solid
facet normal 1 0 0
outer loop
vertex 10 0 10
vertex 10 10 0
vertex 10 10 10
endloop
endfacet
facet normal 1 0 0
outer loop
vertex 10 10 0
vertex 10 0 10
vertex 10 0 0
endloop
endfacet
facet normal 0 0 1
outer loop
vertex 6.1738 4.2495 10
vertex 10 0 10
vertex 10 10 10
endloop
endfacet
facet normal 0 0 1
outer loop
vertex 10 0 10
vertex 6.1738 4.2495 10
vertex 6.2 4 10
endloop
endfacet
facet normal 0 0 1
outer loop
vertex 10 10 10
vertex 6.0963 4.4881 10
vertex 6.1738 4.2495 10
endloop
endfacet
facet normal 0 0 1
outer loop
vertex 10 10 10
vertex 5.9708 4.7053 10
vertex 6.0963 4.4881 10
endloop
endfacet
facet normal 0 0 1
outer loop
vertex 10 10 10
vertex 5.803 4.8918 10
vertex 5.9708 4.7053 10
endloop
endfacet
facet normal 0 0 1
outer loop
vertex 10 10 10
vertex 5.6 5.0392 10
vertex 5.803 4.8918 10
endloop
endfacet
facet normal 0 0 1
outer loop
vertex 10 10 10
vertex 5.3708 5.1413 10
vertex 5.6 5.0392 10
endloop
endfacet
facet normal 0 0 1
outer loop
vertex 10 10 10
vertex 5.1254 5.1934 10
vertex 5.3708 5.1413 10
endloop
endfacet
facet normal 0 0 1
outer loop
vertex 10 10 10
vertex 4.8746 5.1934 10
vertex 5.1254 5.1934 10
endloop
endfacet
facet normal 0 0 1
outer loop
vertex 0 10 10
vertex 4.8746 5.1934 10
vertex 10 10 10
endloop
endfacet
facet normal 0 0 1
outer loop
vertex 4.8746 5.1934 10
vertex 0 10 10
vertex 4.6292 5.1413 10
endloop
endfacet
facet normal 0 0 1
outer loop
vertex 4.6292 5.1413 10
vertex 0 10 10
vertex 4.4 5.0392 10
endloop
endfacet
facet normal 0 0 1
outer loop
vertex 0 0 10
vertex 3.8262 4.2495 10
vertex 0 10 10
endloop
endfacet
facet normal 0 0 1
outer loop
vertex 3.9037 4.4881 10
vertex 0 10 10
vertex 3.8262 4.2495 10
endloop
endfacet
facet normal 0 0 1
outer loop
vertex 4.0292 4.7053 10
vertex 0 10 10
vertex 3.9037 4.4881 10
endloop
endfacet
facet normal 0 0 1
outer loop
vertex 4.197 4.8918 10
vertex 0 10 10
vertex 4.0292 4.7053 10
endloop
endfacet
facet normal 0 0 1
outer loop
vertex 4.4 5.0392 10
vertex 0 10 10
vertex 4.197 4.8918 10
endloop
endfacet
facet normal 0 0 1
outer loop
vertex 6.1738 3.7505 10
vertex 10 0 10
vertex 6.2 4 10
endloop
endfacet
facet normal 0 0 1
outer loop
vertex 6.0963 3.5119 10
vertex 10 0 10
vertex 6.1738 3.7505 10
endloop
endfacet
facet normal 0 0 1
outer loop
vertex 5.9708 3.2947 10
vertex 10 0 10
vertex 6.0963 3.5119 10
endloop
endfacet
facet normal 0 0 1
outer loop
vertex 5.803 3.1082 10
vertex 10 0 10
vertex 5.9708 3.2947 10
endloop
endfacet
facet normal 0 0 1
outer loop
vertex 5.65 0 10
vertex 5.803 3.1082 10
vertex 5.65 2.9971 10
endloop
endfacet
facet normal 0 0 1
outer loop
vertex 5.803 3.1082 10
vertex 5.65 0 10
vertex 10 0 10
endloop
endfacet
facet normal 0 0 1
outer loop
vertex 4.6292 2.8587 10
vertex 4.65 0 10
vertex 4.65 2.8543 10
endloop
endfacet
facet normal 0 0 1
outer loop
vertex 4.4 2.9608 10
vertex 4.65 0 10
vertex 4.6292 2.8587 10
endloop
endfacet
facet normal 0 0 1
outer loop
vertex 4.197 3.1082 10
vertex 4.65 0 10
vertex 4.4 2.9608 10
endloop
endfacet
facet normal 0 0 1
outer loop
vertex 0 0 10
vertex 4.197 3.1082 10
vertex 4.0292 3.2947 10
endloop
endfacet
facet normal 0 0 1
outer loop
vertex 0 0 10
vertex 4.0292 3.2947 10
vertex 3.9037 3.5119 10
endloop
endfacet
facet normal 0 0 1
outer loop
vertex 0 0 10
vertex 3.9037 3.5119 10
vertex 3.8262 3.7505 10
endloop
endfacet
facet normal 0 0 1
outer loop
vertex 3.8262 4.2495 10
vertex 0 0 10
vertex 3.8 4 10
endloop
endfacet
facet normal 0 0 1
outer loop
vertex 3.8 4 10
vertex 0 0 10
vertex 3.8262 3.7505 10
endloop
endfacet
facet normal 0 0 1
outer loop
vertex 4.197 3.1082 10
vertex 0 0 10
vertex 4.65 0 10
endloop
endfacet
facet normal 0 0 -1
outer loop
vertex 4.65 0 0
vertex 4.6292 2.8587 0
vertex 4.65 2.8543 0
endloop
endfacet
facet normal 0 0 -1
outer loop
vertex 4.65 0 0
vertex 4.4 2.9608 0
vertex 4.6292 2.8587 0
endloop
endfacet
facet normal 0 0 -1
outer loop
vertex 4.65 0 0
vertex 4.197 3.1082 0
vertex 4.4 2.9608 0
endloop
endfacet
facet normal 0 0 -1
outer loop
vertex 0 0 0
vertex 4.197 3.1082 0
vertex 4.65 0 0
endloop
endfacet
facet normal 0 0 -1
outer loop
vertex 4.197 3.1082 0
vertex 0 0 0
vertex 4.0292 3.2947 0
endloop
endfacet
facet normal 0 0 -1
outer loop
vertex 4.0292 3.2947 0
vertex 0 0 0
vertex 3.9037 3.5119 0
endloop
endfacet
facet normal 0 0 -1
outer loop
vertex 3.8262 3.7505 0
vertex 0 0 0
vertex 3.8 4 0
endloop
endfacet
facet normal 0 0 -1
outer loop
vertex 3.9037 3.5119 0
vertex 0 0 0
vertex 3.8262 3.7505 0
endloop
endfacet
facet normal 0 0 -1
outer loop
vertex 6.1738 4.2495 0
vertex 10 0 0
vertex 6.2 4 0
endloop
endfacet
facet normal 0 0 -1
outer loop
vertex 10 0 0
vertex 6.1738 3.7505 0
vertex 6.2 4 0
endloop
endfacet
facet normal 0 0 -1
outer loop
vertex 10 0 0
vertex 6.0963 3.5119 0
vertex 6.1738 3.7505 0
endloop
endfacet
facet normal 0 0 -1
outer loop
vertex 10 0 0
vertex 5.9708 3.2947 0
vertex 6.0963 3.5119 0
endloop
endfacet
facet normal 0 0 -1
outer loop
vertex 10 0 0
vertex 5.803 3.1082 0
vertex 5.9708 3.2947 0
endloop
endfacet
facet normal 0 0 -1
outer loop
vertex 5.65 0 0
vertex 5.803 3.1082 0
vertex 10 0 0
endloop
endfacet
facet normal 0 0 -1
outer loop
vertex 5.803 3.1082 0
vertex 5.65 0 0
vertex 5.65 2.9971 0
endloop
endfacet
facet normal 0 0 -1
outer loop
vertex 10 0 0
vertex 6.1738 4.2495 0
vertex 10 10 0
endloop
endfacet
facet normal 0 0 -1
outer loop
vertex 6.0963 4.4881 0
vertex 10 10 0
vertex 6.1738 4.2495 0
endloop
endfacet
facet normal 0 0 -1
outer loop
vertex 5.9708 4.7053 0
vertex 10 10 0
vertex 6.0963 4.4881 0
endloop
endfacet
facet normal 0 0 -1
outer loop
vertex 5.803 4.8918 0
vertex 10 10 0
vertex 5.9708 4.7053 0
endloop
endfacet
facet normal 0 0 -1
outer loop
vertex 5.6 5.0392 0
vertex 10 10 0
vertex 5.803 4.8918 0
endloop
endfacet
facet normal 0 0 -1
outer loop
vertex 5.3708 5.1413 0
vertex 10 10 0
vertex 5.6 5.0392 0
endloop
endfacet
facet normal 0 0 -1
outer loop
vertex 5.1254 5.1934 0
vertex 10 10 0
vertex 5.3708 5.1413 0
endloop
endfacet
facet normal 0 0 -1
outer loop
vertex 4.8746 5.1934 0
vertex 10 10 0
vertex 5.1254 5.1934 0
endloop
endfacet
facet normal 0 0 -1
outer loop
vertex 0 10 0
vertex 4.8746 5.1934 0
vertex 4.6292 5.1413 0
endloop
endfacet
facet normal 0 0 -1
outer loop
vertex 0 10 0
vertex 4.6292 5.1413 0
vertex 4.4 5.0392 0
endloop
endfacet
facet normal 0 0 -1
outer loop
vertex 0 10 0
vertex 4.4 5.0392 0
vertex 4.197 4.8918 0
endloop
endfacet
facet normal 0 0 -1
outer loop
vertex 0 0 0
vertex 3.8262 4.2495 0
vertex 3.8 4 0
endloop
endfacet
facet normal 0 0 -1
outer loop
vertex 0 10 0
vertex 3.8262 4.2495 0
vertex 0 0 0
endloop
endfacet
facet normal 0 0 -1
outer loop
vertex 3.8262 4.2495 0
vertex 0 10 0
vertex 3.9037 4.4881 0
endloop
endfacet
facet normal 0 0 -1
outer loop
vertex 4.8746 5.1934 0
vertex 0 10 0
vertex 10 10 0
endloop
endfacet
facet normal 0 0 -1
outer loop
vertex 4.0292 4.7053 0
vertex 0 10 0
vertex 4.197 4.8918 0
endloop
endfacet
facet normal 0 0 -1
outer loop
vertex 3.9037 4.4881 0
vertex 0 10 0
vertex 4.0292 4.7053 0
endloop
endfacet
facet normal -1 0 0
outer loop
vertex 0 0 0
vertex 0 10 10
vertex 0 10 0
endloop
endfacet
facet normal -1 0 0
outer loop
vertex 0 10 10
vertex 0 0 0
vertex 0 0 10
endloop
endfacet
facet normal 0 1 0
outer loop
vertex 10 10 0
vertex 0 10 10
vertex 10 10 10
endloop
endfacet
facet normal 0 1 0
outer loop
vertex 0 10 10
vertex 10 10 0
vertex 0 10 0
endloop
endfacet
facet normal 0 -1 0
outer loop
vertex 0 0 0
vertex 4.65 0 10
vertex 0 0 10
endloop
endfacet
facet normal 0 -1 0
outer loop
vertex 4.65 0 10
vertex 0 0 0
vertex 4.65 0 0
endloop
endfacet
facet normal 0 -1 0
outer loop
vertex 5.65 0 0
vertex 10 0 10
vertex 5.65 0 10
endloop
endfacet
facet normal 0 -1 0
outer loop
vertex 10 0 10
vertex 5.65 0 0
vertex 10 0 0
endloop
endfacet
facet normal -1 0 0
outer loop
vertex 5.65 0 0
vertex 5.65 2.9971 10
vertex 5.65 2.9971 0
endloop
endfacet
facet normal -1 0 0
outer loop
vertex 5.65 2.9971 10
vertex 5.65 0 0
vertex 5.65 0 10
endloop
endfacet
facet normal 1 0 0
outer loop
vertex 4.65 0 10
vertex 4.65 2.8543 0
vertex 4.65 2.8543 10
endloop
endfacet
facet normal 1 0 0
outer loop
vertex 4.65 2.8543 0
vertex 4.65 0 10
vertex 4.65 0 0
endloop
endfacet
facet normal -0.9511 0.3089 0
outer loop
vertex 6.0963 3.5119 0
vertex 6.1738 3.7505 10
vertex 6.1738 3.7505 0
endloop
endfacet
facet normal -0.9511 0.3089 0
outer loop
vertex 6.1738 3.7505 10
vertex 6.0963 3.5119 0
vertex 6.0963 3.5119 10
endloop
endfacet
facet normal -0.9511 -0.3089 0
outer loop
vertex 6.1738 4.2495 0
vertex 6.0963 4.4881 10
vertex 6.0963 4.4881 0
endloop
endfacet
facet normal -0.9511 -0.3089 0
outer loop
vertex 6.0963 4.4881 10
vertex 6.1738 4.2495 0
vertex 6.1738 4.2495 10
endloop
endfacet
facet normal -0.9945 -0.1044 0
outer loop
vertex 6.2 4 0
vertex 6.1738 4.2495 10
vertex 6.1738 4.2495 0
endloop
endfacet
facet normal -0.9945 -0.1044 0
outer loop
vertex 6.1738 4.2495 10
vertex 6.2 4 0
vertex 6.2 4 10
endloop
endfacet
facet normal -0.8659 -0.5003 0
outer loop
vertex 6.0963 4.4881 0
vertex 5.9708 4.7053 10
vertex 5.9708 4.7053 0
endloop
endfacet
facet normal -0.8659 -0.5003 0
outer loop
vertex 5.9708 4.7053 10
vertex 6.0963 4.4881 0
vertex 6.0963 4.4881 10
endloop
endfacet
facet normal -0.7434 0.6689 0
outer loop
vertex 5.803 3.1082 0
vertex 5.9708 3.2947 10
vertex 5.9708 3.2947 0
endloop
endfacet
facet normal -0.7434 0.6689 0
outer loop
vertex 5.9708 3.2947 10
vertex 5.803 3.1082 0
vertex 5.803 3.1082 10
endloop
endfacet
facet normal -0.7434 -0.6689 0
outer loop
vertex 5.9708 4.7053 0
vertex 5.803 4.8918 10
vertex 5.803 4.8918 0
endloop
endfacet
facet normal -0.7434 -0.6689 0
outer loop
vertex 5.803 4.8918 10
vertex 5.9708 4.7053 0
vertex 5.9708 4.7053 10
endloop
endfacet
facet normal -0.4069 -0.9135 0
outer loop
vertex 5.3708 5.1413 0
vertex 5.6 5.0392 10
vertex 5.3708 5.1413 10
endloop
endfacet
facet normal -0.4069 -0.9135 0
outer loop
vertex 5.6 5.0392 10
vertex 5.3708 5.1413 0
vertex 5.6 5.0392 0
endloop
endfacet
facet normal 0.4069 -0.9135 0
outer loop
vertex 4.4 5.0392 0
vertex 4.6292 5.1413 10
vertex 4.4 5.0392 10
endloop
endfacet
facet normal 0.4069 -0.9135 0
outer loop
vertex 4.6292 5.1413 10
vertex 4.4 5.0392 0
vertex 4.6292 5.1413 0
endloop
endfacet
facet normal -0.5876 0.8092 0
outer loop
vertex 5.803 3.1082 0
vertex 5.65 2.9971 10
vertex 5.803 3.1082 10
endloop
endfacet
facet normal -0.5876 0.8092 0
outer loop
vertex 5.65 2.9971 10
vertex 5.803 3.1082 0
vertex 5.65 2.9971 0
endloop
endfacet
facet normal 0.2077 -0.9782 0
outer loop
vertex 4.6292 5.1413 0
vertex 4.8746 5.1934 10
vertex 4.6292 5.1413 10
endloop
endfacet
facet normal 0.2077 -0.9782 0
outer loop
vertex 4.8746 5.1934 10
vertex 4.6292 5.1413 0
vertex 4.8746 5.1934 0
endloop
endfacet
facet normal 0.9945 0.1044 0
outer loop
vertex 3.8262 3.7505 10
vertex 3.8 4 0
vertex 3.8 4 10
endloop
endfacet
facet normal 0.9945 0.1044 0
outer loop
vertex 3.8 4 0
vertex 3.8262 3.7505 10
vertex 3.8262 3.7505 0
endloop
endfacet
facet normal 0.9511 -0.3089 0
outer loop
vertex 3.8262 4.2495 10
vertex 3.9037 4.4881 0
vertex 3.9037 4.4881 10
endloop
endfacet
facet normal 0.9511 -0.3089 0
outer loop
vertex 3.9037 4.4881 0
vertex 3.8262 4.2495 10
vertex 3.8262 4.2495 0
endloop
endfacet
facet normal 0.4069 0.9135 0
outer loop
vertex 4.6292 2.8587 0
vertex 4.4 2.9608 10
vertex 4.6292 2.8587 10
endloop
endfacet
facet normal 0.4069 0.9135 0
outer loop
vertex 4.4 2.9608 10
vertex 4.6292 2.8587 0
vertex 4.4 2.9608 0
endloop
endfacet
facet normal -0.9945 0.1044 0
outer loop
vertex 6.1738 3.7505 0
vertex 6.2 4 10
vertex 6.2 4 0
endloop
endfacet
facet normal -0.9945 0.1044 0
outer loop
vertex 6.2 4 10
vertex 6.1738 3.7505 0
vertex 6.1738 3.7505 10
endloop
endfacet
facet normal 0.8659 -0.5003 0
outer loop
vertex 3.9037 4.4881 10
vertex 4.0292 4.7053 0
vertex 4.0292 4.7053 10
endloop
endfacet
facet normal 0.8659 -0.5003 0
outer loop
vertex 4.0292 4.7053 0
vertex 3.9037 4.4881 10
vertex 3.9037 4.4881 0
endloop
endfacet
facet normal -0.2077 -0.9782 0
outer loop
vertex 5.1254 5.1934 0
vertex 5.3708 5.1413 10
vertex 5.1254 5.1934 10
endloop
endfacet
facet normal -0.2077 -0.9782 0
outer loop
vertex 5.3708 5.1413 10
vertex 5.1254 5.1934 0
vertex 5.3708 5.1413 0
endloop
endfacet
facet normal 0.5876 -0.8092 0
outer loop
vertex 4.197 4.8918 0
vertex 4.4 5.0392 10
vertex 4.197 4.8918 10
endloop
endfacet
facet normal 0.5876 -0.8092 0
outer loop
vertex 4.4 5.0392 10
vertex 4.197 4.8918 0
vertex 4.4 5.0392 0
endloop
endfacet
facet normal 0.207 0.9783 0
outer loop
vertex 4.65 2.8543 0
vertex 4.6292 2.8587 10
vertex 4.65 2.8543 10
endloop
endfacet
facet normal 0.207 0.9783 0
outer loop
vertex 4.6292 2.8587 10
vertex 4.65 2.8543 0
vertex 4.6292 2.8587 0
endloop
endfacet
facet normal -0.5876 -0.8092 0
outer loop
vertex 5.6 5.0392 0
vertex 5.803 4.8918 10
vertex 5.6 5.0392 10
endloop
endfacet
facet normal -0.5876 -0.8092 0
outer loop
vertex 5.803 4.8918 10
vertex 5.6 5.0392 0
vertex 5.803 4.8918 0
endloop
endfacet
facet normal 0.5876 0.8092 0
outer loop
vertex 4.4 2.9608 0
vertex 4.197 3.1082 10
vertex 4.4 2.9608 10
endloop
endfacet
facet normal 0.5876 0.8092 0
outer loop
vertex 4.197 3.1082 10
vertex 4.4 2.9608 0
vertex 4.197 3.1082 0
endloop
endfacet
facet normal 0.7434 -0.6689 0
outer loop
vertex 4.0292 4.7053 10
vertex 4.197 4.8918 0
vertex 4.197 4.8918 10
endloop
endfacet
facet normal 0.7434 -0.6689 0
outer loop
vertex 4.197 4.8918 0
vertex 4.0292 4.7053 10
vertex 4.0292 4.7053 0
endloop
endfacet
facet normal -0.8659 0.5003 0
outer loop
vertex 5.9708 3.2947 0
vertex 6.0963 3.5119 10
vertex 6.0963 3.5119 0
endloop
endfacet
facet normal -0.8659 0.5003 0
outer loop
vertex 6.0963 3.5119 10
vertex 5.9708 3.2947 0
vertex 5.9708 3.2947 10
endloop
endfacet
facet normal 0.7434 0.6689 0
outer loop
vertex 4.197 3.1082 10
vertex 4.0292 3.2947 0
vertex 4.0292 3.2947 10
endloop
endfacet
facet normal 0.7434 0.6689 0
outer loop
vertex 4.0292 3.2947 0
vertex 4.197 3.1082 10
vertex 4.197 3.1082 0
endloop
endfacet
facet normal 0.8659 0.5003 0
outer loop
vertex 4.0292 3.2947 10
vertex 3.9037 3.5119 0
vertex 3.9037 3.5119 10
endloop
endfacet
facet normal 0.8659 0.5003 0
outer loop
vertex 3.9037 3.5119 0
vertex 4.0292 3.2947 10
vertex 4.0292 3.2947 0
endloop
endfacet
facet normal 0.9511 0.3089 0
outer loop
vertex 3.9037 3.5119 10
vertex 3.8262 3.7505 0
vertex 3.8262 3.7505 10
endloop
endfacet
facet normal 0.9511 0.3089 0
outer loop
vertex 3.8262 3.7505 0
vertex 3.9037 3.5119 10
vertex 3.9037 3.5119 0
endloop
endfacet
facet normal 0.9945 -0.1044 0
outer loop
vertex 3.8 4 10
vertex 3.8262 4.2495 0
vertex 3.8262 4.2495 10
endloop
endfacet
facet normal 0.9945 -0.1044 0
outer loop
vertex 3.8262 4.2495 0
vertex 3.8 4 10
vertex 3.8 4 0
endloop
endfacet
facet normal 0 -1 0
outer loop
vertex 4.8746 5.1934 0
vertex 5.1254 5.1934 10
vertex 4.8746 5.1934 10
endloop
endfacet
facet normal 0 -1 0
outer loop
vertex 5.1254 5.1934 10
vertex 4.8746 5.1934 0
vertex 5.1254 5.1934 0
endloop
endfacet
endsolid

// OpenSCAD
module thefinger(){
linear_extrude(height=5, center=true, convexity = 10)
import (file = "newexport.dxf");
}
rotate([-90,0,0])translate([-16,-15,8])scale([0.25,0.25,1])thefinger();
difference(){
    translate([0,0,0])cube ([10,10,10]);
   translate([4.65,-10,0])cube ([1,15,15]);
   translate([5,4,0])cylinder(h = 20, r=1.2,$fn=30);
}
